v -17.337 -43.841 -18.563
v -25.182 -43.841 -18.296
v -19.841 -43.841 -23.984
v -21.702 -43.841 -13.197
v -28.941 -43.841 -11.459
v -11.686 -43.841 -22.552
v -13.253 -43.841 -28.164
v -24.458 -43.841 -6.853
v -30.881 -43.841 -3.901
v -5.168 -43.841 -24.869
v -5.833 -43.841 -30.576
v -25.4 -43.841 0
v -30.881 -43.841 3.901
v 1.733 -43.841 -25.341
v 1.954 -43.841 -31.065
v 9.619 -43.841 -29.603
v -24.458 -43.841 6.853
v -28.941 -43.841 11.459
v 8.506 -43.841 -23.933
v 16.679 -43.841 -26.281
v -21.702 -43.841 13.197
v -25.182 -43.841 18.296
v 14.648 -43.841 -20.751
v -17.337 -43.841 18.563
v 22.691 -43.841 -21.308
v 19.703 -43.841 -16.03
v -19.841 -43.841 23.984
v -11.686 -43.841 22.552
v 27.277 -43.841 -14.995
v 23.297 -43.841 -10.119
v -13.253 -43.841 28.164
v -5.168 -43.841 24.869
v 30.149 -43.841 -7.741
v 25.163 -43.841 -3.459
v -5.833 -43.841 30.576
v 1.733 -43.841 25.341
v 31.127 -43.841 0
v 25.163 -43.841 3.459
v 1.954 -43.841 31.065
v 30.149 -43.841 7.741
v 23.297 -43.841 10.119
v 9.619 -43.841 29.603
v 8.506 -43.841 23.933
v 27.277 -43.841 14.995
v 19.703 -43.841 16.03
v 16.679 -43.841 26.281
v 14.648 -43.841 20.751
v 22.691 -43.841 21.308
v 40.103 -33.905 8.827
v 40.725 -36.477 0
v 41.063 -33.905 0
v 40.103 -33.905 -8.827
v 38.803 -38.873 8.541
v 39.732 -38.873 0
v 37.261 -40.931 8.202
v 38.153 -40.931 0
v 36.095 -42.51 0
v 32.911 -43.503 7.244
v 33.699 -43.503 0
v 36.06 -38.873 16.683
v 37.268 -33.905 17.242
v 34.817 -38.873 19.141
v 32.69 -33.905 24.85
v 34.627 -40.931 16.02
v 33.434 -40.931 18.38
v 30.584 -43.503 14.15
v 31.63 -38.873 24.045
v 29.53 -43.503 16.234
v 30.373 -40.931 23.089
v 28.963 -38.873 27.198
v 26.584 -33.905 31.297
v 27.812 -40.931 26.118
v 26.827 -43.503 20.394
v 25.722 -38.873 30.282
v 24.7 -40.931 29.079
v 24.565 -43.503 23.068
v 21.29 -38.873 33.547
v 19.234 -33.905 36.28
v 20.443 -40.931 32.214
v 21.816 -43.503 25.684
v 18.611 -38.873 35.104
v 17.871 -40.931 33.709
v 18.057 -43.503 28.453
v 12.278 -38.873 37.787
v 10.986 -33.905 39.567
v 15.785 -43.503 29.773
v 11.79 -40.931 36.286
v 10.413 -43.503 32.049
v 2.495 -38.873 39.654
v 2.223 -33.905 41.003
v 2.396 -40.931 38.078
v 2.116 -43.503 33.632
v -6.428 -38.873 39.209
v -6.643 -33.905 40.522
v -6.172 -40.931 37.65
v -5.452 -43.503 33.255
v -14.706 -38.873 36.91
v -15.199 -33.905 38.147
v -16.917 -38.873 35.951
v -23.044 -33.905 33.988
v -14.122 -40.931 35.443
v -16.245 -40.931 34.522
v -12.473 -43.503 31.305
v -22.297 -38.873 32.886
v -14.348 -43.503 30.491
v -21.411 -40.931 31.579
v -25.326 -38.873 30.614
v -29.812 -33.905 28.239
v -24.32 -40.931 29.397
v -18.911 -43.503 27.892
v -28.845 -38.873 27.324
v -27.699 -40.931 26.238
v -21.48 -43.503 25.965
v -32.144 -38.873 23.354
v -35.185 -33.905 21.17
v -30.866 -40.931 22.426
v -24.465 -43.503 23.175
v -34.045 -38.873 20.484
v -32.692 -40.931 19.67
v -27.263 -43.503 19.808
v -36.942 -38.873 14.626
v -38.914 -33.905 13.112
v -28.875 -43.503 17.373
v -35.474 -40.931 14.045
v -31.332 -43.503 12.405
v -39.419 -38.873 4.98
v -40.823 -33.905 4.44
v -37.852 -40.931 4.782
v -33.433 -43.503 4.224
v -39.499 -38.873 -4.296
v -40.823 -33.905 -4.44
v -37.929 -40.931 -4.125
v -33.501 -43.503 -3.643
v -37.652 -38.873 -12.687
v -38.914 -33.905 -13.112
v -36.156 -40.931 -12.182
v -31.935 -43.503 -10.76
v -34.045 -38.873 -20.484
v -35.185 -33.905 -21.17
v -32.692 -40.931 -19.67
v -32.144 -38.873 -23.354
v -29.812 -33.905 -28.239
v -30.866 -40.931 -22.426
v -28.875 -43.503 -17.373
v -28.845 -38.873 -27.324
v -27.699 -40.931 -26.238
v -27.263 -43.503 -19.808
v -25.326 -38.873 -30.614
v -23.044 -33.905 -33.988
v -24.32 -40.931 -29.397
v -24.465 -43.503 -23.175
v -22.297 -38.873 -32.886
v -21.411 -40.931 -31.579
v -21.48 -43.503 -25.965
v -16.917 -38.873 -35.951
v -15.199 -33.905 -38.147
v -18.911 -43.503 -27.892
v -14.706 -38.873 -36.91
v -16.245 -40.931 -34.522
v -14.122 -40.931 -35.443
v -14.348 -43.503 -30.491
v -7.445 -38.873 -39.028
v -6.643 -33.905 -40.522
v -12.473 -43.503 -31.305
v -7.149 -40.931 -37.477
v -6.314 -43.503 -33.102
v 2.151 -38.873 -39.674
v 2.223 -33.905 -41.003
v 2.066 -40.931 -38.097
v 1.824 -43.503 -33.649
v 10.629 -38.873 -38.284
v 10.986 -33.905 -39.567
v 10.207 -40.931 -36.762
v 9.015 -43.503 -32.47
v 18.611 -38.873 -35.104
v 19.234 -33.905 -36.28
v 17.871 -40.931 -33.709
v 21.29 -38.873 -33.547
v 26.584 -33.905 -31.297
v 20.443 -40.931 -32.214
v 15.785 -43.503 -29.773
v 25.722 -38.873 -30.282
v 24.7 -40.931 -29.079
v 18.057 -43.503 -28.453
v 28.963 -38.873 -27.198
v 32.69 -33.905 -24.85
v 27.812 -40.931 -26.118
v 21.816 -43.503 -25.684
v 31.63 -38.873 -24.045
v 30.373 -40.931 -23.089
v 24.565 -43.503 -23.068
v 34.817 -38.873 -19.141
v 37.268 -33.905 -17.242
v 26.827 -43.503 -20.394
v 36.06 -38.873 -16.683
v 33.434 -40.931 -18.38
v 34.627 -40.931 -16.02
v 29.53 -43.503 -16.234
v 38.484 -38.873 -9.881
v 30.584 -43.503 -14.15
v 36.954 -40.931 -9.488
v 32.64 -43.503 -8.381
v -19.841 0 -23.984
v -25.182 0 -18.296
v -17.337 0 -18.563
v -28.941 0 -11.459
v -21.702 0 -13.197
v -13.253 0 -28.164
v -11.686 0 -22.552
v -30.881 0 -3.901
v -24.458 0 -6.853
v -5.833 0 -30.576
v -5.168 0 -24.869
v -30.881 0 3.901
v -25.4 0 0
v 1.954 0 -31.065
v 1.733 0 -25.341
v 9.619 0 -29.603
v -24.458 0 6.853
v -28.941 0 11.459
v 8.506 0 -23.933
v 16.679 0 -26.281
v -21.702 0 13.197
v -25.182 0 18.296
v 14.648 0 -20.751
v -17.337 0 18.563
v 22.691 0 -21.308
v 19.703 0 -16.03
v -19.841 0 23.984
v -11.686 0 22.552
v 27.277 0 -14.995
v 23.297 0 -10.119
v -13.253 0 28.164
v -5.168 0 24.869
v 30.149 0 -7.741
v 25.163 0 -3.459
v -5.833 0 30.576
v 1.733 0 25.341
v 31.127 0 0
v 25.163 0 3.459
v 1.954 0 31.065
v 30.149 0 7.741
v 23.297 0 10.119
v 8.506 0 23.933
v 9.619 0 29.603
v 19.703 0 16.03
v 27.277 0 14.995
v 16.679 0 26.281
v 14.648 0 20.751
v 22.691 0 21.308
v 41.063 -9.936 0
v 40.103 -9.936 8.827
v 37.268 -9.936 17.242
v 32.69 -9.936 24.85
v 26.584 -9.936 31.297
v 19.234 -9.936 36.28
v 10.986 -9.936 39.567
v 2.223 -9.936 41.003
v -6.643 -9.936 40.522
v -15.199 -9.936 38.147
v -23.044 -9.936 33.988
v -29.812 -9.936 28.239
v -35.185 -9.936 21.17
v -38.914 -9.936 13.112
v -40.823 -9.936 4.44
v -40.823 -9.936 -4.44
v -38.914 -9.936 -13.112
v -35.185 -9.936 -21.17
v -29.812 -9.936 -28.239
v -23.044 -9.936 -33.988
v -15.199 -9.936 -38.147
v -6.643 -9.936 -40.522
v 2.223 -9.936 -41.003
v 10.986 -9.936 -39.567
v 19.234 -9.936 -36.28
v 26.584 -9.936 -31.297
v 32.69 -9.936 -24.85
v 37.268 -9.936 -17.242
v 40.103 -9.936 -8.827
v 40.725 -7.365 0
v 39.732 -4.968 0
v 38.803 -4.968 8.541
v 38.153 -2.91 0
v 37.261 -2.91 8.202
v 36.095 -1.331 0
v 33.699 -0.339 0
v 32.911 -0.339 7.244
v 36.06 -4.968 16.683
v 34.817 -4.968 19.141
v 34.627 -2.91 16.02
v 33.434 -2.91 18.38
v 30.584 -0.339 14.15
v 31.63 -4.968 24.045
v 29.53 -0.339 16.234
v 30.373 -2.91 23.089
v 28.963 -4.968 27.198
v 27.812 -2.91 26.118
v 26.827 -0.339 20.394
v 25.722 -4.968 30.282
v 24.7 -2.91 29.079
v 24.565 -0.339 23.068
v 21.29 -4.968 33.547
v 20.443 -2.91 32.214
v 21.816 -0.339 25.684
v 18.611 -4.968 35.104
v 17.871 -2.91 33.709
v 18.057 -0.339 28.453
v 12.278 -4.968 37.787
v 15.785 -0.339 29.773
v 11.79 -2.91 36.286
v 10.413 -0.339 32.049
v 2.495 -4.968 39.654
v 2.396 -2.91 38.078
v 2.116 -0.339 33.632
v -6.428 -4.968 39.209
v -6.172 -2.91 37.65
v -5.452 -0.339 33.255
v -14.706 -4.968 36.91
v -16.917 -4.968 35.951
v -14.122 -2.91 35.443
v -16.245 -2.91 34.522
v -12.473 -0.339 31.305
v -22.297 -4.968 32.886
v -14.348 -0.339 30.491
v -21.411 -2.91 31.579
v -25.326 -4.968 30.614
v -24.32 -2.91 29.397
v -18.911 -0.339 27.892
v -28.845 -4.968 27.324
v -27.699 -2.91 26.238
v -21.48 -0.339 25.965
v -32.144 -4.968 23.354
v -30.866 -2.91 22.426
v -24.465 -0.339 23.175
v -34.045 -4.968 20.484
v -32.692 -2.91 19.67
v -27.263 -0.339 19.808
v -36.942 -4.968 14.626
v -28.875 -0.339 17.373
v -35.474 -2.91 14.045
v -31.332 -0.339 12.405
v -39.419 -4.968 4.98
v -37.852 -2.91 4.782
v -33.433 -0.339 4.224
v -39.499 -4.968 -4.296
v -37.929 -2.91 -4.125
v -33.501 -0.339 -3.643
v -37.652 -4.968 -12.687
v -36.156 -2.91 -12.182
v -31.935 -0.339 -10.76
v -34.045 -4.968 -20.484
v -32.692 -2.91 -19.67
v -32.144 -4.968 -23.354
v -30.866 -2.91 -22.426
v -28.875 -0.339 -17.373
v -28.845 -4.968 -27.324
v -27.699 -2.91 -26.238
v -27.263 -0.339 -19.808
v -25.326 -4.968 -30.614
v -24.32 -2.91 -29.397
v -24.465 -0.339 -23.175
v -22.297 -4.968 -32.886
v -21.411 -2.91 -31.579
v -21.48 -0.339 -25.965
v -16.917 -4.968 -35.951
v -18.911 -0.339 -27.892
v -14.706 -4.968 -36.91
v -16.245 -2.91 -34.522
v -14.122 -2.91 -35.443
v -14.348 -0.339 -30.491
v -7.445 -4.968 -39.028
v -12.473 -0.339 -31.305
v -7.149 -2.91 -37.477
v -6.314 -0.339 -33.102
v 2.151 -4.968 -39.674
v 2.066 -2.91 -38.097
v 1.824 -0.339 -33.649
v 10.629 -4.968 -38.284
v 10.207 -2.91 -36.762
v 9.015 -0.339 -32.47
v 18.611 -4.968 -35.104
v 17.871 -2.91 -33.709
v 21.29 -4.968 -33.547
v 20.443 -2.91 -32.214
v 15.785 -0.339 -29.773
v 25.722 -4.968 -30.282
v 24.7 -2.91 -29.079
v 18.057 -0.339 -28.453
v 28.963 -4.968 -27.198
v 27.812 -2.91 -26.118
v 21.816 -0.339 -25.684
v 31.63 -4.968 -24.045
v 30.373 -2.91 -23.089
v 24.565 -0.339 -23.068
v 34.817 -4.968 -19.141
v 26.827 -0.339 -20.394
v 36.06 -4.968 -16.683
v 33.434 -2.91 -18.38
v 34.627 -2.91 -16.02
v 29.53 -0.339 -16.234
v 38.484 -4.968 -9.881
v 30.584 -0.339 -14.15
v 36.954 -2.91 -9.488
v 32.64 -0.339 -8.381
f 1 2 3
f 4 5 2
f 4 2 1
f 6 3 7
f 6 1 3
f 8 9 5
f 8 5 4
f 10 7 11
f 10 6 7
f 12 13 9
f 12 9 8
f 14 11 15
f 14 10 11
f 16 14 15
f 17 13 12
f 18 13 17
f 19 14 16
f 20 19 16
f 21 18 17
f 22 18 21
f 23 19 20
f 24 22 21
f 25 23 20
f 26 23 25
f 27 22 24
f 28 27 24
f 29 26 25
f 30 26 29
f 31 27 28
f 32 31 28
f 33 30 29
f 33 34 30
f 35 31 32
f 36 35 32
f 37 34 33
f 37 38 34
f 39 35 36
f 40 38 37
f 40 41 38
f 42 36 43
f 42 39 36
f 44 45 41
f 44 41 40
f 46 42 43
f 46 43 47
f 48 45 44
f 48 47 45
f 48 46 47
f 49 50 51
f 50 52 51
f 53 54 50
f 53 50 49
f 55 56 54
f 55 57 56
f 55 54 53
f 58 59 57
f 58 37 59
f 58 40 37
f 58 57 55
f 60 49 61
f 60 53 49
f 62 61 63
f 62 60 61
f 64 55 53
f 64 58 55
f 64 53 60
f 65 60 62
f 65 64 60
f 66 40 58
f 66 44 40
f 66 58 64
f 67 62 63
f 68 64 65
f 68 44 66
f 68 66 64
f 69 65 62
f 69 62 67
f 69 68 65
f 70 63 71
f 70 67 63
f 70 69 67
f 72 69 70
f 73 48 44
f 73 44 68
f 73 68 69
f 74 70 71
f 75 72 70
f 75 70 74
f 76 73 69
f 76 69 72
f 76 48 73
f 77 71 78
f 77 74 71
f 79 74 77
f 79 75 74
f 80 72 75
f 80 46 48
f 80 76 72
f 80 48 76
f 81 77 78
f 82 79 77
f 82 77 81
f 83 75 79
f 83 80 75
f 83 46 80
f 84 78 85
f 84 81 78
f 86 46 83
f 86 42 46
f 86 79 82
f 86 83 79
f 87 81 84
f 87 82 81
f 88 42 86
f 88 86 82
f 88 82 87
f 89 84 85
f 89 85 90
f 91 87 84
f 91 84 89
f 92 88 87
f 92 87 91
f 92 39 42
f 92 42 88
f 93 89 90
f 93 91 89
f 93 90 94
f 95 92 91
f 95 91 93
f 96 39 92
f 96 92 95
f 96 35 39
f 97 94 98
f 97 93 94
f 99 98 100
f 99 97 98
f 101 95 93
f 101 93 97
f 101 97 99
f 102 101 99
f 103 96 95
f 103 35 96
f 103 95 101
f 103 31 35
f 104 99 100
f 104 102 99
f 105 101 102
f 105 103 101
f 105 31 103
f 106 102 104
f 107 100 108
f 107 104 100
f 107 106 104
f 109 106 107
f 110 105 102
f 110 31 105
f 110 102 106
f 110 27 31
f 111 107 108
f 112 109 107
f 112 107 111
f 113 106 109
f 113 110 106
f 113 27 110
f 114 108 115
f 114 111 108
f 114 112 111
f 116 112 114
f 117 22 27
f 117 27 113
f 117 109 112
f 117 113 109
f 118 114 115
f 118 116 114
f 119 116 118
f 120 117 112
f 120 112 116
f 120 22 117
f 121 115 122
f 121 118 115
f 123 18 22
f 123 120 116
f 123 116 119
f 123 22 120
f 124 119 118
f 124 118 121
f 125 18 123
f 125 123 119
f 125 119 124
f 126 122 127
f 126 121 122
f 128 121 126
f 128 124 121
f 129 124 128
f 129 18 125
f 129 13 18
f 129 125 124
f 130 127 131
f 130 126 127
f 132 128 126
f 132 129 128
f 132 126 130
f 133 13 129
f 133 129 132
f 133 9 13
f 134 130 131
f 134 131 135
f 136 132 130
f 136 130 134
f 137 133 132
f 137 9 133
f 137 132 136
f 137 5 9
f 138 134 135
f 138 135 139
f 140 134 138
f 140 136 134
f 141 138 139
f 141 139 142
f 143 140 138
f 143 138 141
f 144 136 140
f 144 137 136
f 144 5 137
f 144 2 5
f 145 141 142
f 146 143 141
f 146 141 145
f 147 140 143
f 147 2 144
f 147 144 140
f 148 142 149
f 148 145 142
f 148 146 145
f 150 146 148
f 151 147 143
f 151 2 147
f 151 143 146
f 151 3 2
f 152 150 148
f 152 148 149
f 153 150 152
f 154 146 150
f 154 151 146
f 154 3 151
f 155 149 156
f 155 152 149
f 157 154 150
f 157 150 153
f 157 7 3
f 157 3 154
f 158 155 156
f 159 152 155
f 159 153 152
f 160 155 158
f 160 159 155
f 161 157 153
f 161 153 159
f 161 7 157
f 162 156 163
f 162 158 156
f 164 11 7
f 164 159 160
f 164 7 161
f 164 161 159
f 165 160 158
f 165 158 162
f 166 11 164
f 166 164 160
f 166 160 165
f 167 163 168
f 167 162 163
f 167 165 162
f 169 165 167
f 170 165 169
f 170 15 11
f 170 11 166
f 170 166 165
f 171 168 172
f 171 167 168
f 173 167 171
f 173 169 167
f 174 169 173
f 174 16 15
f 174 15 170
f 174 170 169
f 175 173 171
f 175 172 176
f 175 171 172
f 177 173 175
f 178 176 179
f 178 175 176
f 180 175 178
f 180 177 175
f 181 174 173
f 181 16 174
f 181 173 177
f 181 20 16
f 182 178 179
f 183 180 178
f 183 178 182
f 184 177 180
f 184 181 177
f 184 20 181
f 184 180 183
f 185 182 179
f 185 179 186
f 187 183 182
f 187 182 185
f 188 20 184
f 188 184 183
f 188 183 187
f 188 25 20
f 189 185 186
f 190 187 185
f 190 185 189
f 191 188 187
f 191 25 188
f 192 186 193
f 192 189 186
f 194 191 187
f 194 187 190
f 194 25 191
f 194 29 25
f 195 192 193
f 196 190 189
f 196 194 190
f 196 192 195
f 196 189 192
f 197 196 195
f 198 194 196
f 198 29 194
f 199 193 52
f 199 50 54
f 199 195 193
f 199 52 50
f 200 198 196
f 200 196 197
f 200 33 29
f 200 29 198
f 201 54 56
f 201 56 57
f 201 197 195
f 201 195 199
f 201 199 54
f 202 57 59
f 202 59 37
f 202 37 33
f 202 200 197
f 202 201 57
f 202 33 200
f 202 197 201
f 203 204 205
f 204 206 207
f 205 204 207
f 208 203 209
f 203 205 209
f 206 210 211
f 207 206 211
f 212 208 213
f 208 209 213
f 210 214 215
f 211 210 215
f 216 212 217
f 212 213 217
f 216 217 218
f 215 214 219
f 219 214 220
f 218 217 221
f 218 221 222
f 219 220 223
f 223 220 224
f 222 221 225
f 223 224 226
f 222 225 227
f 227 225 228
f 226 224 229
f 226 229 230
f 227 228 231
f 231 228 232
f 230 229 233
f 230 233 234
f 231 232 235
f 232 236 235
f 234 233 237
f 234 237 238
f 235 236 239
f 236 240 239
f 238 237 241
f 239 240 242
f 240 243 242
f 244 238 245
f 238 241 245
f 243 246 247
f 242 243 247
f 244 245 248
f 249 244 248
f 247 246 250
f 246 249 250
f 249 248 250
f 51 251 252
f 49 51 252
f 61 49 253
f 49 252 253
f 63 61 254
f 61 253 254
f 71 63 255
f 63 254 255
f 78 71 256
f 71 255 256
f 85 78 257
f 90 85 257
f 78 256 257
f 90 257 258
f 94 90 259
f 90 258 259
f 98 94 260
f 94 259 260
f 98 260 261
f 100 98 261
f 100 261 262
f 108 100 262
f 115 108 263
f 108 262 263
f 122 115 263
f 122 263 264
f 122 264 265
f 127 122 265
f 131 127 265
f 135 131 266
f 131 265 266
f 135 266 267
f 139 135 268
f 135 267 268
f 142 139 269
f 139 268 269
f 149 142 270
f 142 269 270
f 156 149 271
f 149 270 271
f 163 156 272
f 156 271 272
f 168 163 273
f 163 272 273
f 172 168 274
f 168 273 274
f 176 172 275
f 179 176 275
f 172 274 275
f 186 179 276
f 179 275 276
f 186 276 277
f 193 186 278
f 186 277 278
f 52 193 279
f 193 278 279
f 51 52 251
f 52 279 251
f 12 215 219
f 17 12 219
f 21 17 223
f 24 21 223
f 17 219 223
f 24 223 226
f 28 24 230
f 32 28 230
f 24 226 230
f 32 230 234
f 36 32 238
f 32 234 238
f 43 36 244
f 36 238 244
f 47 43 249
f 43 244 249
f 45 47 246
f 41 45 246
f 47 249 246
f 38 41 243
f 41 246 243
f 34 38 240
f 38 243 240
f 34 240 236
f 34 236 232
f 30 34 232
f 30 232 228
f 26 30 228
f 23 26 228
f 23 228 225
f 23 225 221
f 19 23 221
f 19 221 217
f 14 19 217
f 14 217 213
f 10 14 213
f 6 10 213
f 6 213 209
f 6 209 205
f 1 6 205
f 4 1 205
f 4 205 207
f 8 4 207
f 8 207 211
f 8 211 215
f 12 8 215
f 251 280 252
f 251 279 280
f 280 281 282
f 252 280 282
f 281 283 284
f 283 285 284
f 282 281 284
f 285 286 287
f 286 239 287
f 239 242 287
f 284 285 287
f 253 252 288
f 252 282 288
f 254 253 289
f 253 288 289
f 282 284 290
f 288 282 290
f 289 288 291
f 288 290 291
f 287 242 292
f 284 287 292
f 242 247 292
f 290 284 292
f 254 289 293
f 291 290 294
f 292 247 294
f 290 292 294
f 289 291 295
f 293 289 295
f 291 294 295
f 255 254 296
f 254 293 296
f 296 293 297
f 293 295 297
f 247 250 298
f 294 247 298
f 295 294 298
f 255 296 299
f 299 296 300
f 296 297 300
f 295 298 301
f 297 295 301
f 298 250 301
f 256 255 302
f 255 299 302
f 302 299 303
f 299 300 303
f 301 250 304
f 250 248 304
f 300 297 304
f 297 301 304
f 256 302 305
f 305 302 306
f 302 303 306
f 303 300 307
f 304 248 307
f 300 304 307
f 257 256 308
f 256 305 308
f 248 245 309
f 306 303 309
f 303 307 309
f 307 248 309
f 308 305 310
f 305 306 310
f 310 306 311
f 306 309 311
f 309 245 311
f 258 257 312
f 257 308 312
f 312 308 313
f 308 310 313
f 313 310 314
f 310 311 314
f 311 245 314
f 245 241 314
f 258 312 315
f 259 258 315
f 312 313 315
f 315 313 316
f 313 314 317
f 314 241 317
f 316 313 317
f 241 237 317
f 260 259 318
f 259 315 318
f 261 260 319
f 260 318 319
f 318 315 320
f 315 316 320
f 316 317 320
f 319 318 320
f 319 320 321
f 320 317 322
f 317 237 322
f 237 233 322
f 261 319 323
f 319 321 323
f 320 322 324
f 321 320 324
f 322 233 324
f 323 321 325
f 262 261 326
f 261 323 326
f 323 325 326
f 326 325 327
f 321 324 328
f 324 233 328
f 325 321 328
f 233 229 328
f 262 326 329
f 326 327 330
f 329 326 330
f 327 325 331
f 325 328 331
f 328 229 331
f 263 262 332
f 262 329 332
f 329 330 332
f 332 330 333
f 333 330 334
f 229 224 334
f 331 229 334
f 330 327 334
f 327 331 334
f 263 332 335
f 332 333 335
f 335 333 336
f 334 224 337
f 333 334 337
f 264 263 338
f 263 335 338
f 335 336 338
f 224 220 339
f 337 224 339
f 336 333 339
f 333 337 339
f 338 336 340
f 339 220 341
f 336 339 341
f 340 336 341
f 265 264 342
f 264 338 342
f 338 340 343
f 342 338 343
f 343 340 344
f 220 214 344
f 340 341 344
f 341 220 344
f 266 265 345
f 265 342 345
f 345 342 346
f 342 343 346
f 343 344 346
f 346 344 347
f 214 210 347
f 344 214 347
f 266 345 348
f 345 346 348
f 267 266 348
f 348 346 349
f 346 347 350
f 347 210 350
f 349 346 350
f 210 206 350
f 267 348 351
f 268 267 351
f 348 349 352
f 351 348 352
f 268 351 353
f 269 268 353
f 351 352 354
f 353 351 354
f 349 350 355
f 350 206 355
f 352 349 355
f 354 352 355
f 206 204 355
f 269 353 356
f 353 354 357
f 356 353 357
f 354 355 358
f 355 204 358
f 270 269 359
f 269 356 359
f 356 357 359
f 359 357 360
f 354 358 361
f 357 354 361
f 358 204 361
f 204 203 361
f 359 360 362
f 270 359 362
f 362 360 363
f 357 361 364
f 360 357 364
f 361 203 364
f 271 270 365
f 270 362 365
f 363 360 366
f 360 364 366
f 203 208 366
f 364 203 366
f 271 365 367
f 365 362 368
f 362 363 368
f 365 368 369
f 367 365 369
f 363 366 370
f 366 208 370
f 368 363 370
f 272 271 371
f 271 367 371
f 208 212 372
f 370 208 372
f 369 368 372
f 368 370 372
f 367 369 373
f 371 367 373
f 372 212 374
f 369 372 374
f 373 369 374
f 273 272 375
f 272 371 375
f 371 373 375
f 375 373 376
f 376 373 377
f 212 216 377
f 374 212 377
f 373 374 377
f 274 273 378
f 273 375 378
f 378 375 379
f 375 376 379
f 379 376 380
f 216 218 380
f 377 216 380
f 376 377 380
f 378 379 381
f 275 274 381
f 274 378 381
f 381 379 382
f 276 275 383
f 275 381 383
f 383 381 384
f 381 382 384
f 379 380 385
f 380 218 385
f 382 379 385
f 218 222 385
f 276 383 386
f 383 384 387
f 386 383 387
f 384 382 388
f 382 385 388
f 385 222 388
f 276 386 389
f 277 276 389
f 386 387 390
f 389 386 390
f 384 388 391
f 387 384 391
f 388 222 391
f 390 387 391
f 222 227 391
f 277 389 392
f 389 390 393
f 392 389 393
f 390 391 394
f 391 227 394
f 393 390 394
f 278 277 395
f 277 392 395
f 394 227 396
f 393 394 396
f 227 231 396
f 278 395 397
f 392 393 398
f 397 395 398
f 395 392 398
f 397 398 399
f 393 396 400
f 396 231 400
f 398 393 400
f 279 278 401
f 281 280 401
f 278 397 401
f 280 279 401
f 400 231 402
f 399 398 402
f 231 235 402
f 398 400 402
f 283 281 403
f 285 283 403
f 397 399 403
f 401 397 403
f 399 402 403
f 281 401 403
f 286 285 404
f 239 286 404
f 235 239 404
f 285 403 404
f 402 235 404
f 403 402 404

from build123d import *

# Parameters (mm, degrees)
F0_R     = 41.063309
F1_DEPTH = 43.841228
F2_R     = 9.936428
F4_R     = 23.134928
F5_DEPTH = 27.268376
F6_D     = 50.8


with BuildPart() as f1:
    # F0 (on Front) → F1 (new body)
    with BuildSketch(Plane.XZ):
        Circle(F0_R)
    extrude(amount=F1_DEPTH)

    # F2
    f2_edges = [f1.edges().sort_by_distance(p)[0] for p in [
        (-41.063309, -43.841228, 0),
        (41.063309, -21.920614, 0),
        (-41.063309, 0, 0),
    ]]
    fillet(f2_edges, radius=F2_R)

    # F4 (on face) → F5 (join)
    with BuildSketch(Plane.XZ.offset(43.841228)):
        Circle(F4_R)
    extrude(amount=-F5_DEPTH)

    # F6 (through all)
    with Locations(Plane.XZ.offset(43.841228)):
        with Locations((0, 0)):
            Hole(F6_D / 2)


solid = f1.part
